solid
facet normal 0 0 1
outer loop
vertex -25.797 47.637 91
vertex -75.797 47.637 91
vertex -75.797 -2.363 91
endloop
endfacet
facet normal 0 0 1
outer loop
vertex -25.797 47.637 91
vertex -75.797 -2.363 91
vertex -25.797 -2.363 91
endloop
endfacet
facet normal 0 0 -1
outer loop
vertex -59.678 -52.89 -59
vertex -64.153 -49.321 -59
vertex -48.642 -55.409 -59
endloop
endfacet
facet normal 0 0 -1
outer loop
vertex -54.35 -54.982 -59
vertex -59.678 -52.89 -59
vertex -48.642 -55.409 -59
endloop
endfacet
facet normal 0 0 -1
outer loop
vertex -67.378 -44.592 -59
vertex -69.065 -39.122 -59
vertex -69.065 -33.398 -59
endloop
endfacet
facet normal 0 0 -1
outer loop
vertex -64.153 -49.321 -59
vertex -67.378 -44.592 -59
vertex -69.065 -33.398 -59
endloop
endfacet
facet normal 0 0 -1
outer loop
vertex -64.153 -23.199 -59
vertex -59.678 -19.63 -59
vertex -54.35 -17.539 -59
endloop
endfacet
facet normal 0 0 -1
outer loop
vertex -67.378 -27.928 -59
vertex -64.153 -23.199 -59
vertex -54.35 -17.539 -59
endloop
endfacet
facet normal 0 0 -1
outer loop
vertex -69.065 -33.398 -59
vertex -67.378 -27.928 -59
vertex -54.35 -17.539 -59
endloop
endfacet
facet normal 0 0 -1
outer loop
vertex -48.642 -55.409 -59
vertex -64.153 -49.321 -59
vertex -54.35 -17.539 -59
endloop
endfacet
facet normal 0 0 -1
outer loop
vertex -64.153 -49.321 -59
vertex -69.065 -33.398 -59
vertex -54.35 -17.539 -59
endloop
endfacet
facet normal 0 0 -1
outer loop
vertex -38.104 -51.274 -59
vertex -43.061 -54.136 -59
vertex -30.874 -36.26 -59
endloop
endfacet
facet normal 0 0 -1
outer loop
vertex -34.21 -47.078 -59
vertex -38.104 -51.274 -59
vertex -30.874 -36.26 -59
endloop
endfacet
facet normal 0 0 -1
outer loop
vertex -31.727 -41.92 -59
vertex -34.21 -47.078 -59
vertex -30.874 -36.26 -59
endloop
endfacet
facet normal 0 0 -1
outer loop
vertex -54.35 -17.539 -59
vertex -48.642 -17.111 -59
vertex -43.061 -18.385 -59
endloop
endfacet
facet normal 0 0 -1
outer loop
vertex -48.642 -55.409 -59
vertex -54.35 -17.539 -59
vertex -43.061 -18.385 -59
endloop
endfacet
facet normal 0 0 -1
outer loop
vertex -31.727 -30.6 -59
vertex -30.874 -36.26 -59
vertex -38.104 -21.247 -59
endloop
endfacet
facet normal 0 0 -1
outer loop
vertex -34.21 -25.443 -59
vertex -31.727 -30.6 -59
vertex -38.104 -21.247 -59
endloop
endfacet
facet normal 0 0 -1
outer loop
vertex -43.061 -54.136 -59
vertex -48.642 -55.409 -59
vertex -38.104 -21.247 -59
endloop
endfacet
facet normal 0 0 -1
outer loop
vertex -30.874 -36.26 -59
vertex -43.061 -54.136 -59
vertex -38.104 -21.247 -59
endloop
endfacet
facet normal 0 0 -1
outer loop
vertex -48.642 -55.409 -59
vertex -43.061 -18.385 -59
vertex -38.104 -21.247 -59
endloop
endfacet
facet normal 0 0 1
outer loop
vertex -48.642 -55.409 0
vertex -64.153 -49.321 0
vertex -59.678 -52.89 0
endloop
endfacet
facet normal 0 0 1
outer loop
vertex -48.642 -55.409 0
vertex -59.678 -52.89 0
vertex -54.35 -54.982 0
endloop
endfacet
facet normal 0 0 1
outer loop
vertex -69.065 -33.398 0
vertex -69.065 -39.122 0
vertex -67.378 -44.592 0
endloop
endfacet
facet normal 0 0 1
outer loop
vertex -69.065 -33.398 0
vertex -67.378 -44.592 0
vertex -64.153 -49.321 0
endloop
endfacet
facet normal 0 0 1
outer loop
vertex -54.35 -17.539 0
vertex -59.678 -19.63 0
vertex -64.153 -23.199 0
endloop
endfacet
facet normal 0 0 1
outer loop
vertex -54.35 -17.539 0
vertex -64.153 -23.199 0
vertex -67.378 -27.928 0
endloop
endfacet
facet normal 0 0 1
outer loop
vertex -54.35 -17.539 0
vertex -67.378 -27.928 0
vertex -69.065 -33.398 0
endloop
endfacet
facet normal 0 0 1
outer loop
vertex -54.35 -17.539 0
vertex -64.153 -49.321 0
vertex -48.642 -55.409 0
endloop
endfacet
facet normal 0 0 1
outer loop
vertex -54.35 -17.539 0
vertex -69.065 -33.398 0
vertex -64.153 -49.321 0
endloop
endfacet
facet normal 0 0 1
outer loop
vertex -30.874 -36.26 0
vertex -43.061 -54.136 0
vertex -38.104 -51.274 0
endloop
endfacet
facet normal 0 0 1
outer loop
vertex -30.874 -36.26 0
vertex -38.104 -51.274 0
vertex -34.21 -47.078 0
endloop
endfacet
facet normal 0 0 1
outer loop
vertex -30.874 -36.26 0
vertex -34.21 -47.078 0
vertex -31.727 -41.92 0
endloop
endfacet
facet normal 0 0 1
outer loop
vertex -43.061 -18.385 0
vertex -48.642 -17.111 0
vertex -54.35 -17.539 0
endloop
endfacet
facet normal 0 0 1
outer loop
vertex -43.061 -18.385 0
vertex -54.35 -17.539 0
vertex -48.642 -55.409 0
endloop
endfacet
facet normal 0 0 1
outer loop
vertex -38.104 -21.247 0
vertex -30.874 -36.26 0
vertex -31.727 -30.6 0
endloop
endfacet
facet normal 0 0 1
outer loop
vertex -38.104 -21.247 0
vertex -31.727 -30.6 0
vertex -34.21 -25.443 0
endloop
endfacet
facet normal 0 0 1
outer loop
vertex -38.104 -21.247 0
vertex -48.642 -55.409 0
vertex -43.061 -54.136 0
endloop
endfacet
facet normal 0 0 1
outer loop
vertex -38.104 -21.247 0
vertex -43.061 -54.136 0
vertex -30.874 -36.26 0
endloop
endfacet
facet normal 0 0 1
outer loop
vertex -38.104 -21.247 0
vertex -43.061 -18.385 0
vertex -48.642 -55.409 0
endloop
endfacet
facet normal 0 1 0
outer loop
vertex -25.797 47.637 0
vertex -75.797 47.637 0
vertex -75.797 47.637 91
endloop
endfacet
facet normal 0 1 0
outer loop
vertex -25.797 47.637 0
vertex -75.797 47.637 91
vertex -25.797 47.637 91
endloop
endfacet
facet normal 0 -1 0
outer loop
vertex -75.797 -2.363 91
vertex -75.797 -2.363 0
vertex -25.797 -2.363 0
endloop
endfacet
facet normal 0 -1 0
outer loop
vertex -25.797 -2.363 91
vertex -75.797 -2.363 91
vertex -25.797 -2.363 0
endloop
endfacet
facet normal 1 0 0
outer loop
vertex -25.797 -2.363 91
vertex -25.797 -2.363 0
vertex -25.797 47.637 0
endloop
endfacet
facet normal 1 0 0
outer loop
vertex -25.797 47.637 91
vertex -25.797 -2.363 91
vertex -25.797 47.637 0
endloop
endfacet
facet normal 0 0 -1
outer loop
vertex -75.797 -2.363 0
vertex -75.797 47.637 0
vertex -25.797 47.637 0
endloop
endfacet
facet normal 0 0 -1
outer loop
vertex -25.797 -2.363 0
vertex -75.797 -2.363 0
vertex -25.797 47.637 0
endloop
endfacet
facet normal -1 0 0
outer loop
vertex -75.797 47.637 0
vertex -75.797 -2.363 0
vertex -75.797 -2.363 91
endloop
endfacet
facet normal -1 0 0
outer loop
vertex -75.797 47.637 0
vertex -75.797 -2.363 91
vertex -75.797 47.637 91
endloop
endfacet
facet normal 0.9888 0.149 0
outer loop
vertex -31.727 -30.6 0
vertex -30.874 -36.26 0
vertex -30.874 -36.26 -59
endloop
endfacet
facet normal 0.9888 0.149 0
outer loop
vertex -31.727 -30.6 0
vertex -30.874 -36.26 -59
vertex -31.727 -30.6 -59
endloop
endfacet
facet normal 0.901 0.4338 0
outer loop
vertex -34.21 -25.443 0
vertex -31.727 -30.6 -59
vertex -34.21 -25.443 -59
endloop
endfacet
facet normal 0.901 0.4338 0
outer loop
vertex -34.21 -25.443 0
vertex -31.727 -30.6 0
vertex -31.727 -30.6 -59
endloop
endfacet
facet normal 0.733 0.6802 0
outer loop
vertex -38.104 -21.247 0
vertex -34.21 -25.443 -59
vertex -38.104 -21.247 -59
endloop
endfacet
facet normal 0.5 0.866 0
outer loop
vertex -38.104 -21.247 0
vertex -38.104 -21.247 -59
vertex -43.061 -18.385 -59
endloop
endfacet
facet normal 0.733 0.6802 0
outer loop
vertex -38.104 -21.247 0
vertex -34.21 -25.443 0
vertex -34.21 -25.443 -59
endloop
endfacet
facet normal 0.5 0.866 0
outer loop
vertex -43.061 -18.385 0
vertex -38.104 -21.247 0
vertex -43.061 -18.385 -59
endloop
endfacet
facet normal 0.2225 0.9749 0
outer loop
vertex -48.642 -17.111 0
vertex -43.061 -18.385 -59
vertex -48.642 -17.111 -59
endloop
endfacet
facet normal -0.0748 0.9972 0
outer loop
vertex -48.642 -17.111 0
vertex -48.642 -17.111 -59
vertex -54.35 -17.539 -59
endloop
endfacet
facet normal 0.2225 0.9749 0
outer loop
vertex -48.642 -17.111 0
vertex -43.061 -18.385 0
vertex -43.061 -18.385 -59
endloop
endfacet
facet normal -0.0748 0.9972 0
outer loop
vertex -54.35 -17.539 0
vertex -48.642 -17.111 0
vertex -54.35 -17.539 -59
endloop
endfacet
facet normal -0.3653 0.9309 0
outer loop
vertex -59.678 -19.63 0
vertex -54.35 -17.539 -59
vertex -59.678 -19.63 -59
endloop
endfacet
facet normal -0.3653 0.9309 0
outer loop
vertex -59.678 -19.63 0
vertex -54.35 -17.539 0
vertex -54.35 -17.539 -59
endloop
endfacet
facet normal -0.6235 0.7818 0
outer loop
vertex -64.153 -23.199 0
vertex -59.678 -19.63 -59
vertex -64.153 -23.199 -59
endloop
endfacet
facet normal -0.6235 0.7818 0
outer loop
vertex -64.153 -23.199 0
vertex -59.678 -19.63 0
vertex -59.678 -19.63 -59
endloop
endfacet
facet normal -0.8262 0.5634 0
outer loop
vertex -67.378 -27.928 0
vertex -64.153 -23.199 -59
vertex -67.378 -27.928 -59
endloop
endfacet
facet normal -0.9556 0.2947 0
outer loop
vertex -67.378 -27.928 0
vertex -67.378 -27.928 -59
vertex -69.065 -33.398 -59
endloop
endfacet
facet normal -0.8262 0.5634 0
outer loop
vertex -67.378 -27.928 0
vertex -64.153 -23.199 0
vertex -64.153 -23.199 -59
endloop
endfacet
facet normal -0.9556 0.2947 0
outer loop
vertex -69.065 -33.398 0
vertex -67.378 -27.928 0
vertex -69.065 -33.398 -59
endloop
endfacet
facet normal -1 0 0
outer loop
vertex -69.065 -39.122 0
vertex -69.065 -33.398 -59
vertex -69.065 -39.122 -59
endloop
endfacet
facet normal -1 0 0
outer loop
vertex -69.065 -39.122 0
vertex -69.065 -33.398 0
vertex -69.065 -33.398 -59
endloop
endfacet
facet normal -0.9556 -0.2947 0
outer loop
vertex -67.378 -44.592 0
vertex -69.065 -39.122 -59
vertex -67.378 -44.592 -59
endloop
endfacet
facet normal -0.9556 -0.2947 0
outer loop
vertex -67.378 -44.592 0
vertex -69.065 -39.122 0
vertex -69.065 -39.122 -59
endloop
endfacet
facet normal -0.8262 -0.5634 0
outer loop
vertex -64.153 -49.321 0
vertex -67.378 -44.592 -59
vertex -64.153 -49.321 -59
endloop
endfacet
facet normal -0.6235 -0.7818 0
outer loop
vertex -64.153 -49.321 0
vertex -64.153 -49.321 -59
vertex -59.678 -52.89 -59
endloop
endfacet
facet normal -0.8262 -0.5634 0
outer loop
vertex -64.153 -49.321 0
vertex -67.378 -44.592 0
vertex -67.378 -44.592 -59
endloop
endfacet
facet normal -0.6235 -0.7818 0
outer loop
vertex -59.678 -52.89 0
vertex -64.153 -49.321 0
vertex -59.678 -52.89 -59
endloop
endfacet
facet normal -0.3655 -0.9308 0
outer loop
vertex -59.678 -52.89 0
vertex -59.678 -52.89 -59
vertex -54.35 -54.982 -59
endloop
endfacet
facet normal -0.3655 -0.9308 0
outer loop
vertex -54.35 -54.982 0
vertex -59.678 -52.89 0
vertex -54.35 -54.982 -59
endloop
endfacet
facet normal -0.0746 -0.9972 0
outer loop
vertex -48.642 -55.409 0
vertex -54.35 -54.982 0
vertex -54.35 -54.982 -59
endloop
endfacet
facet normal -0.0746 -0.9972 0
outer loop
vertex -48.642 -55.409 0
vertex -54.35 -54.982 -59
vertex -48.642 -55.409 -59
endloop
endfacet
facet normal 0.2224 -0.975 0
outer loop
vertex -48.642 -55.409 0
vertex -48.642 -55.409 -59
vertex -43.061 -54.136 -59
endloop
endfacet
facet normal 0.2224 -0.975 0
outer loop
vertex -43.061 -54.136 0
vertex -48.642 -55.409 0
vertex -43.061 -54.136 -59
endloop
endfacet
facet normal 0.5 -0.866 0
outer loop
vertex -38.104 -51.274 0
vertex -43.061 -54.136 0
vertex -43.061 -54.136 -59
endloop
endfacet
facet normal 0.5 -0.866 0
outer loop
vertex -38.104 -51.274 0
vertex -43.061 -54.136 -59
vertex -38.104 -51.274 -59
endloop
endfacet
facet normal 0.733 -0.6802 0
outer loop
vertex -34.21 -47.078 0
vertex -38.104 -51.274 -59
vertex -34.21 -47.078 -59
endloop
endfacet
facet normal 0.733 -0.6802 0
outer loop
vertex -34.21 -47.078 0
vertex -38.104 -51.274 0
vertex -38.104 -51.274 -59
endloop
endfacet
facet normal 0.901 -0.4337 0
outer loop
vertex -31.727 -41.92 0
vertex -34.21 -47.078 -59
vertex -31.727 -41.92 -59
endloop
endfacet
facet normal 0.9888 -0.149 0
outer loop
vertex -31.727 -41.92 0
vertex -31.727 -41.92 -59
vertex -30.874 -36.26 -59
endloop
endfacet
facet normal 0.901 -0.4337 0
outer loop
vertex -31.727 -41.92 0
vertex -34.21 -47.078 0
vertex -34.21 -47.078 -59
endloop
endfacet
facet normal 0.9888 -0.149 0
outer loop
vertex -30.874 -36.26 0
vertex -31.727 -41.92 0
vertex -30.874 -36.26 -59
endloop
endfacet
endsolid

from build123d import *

# Parameters (mm, degrees)
F0_W     = 50
F0_H     = 50
F1_DEPTH = 91
F2_R     = 19.202938
F3_DEPTH = 59


with BuildPart() as f1:
    # F0 (on Top) → F1 (new body)
    with BuildSketch(Plane.XY):
        with Locations((-50.797425, 22.637345)):
            Rectangle(F0_W, F0_H)
    extrude(amount=F1_DEPTH)


with BuildPart() as f3:
    # F2 (on Top) → F3 (new body)
    with BuildSketch(Plane.XY):
        with Locations((-50.076704, -36.260143)):
            Circle(F2_R)
    extrude(amount=-F3_DEPTH)


solid = Compound([f1.part, f3.part])
